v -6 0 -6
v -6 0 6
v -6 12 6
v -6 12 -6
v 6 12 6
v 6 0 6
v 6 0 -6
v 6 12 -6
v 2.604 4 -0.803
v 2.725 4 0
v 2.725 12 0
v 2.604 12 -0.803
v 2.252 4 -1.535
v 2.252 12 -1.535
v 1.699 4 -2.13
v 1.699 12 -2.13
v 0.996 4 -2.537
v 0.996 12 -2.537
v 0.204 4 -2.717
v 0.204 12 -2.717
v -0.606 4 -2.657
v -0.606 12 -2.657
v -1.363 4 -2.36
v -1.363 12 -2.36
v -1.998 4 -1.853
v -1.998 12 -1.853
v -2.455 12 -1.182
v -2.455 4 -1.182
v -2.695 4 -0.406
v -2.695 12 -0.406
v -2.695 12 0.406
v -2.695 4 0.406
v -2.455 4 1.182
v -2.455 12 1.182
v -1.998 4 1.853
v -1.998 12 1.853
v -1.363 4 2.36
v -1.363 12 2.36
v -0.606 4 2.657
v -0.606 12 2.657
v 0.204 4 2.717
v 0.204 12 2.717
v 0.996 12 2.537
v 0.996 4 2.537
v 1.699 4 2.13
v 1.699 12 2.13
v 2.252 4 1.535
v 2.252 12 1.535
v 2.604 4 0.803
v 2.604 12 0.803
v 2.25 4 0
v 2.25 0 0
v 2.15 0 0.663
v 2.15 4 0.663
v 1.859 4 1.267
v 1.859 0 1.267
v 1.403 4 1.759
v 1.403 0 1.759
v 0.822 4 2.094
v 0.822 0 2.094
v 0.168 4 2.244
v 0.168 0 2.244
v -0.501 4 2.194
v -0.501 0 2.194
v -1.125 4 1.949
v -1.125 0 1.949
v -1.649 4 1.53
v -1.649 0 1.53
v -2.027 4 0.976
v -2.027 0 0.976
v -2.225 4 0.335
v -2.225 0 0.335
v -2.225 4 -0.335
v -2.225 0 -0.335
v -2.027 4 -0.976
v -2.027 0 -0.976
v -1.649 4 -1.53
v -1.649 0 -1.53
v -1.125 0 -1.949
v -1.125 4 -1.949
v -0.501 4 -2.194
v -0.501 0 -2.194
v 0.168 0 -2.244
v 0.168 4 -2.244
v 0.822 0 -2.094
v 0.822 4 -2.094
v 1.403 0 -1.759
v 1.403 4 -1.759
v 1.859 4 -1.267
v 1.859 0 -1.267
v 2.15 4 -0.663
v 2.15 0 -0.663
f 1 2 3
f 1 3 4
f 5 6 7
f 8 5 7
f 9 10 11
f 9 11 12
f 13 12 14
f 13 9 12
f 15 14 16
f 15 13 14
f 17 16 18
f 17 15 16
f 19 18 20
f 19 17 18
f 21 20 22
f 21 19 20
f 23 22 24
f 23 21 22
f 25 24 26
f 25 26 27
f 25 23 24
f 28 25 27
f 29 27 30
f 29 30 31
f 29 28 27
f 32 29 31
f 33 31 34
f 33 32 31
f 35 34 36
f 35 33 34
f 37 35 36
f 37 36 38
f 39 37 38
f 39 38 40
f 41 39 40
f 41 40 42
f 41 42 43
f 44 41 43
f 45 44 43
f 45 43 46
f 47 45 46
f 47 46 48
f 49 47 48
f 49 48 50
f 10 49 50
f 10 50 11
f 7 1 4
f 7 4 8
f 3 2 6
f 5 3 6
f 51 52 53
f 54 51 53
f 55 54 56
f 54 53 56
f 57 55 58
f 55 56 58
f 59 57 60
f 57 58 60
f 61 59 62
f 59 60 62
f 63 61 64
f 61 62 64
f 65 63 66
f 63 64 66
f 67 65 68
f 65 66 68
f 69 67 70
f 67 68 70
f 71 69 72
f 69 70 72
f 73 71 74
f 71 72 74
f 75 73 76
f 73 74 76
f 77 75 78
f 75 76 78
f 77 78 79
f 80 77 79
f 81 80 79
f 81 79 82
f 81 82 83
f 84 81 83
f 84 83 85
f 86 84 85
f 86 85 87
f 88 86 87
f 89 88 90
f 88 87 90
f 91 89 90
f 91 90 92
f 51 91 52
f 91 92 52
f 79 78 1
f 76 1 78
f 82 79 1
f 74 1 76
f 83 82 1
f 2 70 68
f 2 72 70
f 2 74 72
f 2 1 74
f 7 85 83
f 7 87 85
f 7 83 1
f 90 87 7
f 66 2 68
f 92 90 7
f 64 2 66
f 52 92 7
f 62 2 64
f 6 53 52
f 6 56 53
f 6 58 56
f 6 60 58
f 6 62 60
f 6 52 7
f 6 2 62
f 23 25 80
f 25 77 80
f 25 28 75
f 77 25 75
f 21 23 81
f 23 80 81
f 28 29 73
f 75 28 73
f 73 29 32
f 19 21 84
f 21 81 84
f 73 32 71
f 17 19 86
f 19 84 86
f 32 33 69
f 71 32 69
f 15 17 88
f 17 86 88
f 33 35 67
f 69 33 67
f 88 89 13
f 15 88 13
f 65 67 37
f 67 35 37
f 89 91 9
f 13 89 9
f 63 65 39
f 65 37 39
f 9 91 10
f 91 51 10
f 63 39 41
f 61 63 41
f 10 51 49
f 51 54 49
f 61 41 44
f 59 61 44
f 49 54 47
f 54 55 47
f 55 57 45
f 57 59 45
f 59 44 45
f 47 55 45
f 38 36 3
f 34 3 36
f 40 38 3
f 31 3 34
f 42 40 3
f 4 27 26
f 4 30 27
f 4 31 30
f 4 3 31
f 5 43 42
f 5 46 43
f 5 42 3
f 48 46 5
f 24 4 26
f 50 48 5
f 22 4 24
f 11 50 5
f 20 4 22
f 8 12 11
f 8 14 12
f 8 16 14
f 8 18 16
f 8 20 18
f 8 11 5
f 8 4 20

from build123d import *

# Parameters (mm, degrees)
SKETCH1_W           = 12
SKETCH1_H           = 12
SKETCH1_R           = 2.725
BOSS_EXTRUDE1_DEPTH = 12
SKETCH2_R           = 2.725
SKETCH2_R_2         = 2.25
BOSS_EXTRUDE2_DEPTH = 4


with BuildPart() as part:
    # Sketch1 → Boss-Extrude1 (new body)
    with BuildSketch(Plane(origin=(0, 0, 0), x_dir=(1, 0, 0), z_dir=(0, 1, 0))):
        Rectangle(SKETCH1_W, SKETCH1_H)
        Circle(SKETCH1_R, mode=Mode.SUBTRACT)
    extrude(amount=BOSS_EXTRUDE1_DEPTH)

    # Sketch2 → Boss-Extrude2 (add)
    with BuildSketch(Plane.XZ):
        Circle(SKETCH2_R)
        Circle(SKETCH2_R_2, mode=Mode.SUBTRACT)
    extrude(amount=-BOSS_EXTRUDE2_DEPTH)


solid = part.part
